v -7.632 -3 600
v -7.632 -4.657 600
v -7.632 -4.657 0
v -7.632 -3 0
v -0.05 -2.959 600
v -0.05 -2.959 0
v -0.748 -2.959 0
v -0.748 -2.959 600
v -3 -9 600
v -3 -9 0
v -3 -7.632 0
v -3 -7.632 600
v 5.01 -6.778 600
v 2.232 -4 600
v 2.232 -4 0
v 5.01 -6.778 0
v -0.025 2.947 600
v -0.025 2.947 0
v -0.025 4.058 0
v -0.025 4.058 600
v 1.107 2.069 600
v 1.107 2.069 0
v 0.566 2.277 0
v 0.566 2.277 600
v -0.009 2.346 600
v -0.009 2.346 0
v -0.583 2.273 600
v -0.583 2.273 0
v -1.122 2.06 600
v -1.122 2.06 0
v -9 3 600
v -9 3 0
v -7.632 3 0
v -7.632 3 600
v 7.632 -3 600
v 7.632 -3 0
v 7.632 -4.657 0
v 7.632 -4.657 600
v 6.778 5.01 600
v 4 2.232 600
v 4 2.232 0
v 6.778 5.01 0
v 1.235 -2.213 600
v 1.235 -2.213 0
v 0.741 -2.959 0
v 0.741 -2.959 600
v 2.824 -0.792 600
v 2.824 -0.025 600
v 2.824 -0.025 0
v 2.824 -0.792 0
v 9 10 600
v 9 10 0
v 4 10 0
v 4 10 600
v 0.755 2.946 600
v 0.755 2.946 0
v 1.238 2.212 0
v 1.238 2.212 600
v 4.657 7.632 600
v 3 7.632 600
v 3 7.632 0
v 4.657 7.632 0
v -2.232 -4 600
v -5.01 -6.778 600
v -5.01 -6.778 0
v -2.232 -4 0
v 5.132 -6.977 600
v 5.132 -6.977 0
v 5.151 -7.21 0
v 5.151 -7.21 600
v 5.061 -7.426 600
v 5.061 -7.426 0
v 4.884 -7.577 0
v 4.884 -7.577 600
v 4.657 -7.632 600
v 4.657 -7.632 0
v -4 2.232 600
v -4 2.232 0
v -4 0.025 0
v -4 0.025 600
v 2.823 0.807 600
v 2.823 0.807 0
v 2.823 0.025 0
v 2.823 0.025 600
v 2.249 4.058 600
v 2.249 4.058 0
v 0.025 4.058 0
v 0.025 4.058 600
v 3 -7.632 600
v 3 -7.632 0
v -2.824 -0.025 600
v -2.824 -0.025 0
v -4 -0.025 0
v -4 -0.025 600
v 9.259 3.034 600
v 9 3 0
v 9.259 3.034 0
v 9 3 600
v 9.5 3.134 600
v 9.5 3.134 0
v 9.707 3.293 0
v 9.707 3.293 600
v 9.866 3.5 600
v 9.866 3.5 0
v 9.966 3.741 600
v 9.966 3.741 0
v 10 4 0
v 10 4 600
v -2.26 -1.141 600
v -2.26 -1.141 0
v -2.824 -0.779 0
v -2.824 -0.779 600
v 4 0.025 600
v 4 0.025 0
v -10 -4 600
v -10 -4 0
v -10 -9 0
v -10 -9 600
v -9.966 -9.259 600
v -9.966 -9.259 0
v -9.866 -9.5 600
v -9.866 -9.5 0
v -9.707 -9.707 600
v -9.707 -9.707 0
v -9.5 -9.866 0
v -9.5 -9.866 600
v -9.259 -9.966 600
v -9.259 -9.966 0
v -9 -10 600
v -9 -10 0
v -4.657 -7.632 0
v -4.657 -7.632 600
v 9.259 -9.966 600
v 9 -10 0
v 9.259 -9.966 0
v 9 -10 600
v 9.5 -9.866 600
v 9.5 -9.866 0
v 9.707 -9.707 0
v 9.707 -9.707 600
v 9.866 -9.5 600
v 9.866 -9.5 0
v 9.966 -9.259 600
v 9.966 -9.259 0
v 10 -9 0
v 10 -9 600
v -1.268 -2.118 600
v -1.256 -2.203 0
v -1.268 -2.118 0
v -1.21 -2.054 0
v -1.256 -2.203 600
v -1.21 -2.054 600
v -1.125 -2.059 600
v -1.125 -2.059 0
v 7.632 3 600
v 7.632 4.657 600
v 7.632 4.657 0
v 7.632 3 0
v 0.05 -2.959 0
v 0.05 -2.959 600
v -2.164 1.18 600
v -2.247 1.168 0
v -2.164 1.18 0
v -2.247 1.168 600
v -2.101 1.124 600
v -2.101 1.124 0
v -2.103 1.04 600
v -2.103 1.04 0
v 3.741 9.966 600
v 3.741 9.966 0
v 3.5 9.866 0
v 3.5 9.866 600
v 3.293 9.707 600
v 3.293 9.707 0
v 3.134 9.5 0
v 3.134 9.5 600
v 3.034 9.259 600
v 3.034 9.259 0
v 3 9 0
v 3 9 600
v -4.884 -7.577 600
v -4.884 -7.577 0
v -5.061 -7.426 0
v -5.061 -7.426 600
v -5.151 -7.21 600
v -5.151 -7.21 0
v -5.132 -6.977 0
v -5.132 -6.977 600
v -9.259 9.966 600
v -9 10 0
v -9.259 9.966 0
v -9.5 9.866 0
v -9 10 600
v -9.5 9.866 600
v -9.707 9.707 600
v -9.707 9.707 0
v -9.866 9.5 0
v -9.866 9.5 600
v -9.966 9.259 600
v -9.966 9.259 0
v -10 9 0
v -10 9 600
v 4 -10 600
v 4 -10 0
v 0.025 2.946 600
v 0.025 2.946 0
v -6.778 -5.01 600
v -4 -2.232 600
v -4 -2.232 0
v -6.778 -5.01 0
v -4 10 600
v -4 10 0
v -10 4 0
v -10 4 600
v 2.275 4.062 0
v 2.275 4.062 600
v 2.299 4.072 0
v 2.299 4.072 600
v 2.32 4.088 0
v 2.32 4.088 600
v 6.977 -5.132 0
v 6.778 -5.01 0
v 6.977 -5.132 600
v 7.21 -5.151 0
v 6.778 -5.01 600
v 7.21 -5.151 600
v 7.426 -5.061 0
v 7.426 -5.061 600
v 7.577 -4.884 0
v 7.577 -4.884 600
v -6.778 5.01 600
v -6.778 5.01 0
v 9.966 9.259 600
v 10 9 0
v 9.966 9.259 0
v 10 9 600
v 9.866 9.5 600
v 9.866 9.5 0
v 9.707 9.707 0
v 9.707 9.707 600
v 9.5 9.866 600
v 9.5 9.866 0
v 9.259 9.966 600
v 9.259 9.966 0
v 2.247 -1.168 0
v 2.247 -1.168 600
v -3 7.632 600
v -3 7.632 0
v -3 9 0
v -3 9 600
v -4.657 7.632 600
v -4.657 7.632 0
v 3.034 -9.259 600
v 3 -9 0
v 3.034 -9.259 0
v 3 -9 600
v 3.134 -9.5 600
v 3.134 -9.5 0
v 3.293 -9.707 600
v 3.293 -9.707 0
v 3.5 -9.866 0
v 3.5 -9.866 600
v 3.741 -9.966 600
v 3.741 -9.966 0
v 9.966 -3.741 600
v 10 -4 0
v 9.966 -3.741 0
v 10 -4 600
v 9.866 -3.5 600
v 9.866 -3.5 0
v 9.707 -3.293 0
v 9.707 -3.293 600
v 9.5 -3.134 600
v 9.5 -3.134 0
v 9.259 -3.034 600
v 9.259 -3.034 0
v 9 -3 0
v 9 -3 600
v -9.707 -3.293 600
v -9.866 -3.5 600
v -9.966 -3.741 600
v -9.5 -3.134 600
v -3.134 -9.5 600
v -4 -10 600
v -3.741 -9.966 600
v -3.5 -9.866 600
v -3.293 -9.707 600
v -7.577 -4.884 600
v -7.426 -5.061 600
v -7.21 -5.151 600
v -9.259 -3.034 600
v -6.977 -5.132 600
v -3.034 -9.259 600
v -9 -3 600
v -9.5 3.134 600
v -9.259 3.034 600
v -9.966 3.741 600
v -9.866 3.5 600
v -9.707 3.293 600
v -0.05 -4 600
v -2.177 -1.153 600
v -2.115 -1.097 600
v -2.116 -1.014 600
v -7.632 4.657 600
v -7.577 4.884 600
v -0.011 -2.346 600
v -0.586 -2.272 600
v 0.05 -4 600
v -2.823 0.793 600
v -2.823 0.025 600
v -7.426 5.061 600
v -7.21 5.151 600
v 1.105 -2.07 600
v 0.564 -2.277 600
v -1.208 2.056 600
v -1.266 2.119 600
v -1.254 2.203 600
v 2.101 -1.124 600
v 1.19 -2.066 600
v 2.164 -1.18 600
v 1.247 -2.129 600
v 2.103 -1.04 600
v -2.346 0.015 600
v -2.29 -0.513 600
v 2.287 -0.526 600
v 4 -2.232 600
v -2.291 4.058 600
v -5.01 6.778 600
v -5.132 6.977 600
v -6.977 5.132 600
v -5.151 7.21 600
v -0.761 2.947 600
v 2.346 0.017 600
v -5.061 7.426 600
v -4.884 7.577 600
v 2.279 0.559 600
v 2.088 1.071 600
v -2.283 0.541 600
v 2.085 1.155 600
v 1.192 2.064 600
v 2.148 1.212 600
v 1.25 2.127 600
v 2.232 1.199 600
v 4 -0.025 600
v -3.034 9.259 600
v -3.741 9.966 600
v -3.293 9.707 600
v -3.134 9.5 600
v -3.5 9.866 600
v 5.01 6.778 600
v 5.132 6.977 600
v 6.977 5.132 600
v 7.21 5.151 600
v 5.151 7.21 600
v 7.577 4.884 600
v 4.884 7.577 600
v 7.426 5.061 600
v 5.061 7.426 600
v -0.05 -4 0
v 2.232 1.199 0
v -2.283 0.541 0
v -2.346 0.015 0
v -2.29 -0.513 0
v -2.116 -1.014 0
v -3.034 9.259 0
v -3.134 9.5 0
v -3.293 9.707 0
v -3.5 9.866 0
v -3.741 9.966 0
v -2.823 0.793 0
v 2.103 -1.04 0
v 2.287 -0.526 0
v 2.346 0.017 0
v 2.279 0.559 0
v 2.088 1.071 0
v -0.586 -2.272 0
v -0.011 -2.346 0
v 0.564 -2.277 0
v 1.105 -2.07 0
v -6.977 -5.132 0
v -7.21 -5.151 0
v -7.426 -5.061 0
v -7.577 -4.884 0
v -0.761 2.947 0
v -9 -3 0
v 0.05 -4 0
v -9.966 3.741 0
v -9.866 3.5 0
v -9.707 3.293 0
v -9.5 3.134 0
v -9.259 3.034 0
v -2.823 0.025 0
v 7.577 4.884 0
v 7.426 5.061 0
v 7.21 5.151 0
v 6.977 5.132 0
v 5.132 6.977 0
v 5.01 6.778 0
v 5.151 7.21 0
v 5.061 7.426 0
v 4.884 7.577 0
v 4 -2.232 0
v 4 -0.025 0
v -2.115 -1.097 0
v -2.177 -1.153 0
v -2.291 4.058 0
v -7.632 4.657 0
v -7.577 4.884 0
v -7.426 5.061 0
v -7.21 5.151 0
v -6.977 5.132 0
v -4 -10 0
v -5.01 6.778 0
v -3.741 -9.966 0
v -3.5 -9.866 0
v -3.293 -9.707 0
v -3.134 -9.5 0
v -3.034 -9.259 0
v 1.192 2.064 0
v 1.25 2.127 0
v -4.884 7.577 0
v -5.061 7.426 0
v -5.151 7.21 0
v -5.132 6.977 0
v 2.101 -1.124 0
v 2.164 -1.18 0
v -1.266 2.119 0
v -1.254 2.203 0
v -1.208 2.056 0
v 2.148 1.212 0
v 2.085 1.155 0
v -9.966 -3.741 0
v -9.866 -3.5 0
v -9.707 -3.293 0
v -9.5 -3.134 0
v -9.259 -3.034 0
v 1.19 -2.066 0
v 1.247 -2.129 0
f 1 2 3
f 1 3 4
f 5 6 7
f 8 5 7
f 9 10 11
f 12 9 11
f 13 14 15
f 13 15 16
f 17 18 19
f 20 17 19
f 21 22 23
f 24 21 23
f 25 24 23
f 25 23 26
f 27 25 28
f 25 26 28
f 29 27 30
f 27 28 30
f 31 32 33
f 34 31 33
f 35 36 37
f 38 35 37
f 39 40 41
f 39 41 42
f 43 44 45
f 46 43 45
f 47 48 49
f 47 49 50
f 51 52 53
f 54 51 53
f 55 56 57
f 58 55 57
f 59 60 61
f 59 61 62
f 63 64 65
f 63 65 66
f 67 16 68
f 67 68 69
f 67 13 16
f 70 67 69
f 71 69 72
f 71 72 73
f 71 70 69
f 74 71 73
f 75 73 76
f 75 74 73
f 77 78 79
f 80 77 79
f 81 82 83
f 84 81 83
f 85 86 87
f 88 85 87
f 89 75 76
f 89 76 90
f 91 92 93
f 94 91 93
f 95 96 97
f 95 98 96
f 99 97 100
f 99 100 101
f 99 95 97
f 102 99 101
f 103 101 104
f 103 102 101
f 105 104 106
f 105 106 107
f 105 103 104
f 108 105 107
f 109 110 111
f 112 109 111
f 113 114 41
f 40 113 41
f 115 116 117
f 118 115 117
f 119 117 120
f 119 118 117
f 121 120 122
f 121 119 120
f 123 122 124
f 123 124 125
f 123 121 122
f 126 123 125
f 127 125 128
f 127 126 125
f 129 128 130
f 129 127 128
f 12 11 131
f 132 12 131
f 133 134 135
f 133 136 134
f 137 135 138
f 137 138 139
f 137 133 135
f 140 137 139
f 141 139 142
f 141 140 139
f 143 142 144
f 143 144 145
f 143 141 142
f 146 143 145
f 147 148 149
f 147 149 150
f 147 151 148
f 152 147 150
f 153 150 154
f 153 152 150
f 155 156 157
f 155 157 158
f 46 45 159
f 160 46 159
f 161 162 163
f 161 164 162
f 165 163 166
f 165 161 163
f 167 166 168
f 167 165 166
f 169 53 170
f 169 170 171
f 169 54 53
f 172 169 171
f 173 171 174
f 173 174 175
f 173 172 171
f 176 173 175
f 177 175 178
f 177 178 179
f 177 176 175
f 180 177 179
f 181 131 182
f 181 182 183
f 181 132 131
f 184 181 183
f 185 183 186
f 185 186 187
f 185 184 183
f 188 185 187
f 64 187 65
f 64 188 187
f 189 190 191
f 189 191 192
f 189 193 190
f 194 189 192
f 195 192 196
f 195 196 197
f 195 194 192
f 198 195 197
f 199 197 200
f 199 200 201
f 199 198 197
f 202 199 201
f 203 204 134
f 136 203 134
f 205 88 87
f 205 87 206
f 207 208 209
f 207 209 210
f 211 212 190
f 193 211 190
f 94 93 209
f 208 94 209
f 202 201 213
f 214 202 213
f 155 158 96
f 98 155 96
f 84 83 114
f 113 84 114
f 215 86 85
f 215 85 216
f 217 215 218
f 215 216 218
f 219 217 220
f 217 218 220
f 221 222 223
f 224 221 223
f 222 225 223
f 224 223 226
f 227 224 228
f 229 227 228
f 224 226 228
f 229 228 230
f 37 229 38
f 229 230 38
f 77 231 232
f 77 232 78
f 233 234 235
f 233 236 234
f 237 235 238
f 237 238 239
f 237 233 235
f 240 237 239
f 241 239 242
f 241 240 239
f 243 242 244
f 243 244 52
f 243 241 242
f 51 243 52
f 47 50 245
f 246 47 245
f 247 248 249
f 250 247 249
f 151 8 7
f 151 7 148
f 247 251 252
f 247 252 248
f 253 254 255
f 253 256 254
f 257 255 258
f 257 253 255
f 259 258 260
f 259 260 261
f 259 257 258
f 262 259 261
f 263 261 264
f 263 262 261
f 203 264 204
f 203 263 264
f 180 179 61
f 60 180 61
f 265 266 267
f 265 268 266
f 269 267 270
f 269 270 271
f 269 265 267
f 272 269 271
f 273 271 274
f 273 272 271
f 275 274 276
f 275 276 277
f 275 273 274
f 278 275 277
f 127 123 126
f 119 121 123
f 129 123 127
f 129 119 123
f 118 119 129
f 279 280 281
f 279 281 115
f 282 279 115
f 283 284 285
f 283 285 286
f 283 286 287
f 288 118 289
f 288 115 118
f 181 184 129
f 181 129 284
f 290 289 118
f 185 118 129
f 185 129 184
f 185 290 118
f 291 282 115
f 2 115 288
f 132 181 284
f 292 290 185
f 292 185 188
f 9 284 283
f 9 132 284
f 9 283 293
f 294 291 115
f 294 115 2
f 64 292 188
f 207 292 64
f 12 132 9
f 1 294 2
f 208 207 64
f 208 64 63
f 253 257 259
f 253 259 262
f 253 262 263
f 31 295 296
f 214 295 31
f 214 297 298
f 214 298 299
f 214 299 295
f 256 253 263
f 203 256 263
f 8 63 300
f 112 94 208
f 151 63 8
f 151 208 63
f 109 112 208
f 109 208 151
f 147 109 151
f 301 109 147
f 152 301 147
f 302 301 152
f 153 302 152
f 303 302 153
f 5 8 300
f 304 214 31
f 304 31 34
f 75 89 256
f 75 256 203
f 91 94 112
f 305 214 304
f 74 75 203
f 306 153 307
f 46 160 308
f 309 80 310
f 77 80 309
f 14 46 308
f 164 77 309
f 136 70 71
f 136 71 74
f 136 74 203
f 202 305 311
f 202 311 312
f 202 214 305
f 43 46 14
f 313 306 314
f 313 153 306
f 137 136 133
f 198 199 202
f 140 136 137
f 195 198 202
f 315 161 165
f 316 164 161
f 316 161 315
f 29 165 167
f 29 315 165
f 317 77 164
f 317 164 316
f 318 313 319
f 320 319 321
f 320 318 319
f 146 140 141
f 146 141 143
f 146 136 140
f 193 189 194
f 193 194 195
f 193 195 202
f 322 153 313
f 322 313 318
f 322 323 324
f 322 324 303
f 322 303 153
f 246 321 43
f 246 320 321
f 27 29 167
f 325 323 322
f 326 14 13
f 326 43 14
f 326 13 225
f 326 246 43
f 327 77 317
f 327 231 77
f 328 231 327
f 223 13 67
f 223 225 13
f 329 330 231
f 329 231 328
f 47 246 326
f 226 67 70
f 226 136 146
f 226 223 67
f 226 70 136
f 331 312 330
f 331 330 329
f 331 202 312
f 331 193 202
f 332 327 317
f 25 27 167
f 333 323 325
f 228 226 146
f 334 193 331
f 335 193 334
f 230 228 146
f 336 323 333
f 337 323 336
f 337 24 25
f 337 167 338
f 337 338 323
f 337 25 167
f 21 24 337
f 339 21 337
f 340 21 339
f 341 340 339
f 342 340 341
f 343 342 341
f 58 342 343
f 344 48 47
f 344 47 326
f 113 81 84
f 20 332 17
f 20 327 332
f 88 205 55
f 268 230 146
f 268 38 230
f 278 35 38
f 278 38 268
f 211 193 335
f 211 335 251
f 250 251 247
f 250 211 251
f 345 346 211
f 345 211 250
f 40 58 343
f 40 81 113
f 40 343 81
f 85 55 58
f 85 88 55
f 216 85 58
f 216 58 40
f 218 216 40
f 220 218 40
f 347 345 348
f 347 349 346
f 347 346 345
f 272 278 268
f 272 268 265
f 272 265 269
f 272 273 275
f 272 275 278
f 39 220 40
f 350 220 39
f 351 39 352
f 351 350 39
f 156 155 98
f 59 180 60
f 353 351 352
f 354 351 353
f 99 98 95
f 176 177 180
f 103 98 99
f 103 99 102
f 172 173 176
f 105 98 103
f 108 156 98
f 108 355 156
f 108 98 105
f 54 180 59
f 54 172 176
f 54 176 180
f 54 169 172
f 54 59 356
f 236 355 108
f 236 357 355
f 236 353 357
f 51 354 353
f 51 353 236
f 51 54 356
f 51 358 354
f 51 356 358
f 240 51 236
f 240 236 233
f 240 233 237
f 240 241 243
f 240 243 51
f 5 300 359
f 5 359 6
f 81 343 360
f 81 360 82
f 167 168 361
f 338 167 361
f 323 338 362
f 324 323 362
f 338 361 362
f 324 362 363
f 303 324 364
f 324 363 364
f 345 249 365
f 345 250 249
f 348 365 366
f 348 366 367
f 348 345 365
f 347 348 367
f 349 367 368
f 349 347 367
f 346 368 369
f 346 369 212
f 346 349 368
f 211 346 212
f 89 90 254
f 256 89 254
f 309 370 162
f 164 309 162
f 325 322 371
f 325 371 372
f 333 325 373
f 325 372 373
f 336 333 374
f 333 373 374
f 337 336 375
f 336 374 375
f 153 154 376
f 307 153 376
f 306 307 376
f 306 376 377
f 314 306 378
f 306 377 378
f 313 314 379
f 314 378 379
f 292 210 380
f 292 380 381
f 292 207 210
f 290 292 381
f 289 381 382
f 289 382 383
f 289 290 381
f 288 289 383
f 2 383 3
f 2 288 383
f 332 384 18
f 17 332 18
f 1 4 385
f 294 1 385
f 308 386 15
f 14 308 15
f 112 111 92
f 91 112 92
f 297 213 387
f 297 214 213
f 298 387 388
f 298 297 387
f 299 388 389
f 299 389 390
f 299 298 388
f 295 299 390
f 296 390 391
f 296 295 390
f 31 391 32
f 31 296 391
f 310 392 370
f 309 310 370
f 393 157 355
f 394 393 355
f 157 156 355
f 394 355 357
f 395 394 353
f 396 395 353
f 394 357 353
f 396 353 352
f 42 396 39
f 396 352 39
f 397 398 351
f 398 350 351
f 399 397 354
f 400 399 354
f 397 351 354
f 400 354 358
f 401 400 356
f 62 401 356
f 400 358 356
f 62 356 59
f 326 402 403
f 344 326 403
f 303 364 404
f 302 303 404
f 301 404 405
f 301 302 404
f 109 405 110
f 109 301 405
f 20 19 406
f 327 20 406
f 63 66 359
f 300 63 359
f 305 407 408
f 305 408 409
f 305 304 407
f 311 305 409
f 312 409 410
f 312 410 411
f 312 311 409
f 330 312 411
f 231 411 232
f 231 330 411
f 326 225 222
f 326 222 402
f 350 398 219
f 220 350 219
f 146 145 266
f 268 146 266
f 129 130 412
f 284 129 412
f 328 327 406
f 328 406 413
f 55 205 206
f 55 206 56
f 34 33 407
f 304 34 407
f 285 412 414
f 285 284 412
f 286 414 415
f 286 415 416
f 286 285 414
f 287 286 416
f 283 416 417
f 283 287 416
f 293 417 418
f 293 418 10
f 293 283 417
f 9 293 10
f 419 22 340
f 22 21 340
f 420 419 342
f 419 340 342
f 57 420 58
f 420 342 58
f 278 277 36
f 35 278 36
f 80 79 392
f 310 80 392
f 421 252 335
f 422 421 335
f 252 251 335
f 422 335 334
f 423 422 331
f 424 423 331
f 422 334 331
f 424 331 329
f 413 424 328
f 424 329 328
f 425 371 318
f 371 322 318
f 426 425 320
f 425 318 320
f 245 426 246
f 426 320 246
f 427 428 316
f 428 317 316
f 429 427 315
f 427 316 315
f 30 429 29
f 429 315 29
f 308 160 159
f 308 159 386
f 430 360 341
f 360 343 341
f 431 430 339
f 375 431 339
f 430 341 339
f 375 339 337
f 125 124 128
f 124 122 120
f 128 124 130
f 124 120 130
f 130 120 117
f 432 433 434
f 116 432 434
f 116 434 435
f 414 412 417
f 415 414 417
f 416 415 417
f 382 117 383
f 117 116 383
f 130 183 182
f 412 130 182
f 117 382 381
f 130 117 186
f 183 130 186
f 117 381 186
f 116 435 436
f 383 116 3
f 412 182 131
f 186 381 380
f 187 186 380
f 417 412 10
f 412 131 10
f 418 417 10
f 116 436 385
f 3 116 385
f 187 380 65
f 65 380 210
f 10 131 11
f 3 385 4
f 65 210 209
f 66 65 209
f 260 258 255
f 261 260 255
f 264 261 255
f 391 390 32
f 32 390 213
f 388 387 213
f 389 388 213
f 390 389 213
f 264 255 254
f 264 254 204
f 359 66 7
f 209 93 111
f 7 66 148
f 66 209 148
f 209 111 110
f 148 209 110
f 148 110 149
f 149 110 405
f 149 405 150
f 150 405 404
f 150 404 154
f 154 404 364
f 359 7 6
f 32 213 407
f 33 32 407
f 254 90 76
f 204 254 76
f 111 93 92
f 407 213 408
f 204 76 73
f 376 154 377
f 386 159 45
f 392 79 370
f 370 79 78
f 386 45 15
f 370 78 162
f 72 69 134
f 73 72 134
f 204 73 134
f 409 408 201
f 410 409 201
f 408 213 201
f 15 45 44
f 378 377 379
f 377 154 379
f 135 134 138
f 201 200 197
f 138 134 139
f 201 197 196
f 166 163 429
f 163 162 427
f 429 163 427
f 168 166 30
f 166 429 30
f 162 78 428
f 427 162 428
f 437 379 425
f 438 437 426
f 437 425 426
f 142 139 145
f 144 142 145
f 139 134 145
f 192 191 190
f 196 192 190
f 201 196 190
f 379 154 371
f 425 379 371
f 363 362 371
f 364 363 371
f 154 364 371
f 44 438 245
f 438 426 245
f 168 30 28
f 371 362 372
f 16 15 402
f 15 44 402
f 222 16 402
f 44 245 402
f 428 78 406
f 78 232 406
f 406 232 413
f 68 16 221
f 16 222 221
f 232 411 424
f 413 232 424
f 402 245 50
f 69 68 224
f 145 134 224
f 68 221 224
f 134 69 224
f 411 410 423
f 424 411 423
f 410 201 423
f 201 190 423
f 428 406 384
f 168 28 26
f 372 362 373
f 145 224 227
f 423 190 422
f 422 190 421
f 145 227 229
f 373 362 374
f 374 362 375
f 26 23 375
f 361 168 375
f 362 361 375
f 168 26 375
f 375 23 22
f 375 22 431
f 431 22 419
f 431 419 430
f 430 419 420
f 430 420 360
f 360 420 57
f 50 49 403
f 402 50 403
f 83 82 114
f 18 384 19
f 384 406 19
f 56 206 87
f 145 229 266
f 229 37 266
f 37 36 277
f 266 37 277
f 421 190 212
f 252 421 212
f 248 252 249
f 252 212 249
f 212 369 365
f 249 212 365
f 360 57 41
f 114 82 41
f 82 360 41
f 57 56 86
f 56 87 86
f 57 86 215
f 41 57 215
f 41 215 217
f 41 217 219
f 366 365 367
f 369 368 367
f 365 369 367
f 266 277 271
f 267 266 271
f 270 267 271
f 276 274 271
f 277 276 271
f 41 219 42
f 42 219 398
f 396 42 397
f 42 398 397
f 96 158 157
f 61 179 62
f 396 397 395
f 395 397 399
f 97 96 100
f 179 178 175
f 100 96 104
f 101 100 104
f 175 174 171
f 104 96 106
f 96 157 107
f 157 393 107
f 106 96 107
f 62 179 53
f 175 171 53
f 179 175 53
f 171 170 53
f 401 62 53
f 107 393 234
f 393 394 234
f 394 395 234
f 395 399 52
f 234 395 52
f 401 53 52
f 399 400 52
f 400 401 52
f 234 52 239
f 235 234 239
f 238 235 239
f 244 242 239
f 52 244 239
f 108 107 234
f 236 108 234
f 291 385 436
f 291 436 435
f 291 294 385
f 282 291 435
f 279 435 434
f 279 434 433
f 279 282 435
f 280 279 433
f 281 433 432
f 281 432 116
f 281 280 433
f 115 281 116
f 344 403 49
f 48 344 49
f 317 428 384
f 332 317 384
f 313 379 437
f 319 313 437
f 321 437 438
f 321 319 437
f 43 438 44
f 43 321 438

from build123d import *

# Parameters (mm, degrees)
F1_DEPTH = 600
F2_R     = 1
F3_R     = 0.5
F4_R     = 0.1


with BuildPart() as f1:
    # F0 (on Top) → F1 (new body)
    with BuildSketch(Plane.XY):
        with BuildLine():
            Line((-0.025, 4.0583112277), (-2.2905442747, 4.0583112277))
            Line((-2.2905442747, 4.0583112277), (-5.8640526549, 7.6318196079))
            Line((-5.8640526549, 7.6318196079), (-3, 7.6318196079))
            Line((-3, 7.6318196079), (-3, 10))
            Line((-3, 10), (-10, 10))
            Line((-10, 10), (-10, 3))
            Line((-10, 3), (-7.6318196079, 3))
            Line((-7.6318196079, 3), (-7.6318196079, 5.8640526549))
            Line((-7.6318196079, 5.8640526549), (-4, 2.232233047))
            Line((-4, 2.232233047), (-4, 0.025))
            Line((-4, 0.025), (-2.8230957687, 0.025))
            Line((-2.8230957687, 0.025), (-2.8230957687, 0.7926485917))
            Line((-2.8230957687, 0.7926485917), (-1.8740334308, 1.411684829))
            ThreePointArc((-1.8740334308, 1.411684829), (-2.3460869309, 0.0270456781), (-1.906078865, -1.3681077138))
            Line((-1.906078865, -1.3681077138), (-2.8238623803, -0.7794121329))
            Line((-2.8238623803, -0.7794121329), (-2.8238623803, -0.025))
            Line((-2.8238623803, -0.025), (-4, -0.025))
            Line((-4, -0.025), (-4, -2.232233047))
            Line((-4, -2.232233047), (-7.6318196079, -5.8640526549))
            Line((-7.6318196079, -5.8640526549), (-7.6318196079, -3))
            Line((-7.6318196079, -3), (-10, -3))
            Line((-10, -3), (-10, -10))
            Line((-10, -10), (-3, -10))
            Line((-3, -10), (-3, -7.6318196079))
            Line((-3, -7.6318196079), (-5.8640526549, -7.6318196079))
            Line((-5.8640526549, -7.6318196079), (-2.232233047, -4))
            Line((-2.232233047, -4), (-0.05, -4))
            Line((-0.05, -4), (-0.05, -2.9588690959))
            Line((-0.05, -2.9588690959), (-0.7483266194, -2.9588690959))
            Line((-0.7483266194, -2.9588690959), (-1.5537911294, -1.7580069631))
            ThreePointArc((-1.5537911294, -1.7580069631), (-0.0257632285, -2.3461013645), (1.5148107083, -1.7917041816))
            Line((1.5148107083, -1.7917041816), (0.7406048023, -2.9588690959))
            Line((0.7406048023, -2.9588690959), (0.05, -2.9588690959))
            Line((0.05, -2.9588690959), (0.05, -4))
            Line((0.05, -4), (2.232233047, -4))
            Line((2.232233047, -4), (5.8640526549, -7.6318196079))
            Line((5.8640526549, -7.6318196079), (3, -7.6318196079))
            Line((3, -7.6318196079), (3, -10))
            Line((3, -10), (10, -10))
            Line((10, -10), (10, -3))
            Line((10, -3), (7.6318196079, -3))
            Line((7.6318196079, -3), (7.6318196079, -5.8640526549))
            Line((7.6318196079, -5.8640526549), (4, -2.232233047))
            Line((4, -2.232233047), (4, -0.025))
            Line((4, -0.025), (2.8238623803, -0.025))
            Line((2.8238623803, -0.025), (2.8238623803, -0.7921485609))
            Line((2.8238623803, -0.7921485609), (1.8740334308, -1.411684829))
            ThreePointArc((1.8740334308, -1.411684829), (2.3460040432, 0.0334721598), (1.8329957125, 1.4645757318))
            Line((1.8329957125, 1.4645757318), (2.8230957687, 0.8068363719))
            Line((2.8230957687, 0.8068363719), (2.8230957687, 0.025))
            Line((2.8230957687, 0.025), (4, 0.025))
            Line((4, 0.025), (4, 2.232233047))
            Line((4, 2.232233047), (7.6318196079, 5.8640526549))
            Line((7.6318196079, 5.8640526549), (7.6318196079, 3))
            Line((7.6318196079, 3), (10, 3))
            Line((10, 3), (10, 10))
            Line((10, 10), (3, 10))
            Line((3, 10), (3, 7.6318196079))
            Line((3, 7.6318196079), (5.8640526549, 7.6318196079))
            Line((5.8640526549, 7.6318196079), (2.2905442747, 4.0583112277))
            Line((2.2905442747, 4.0583112277), (0.025, 4.0583112277))
            Line((0.025, 4.0583112277), (0.025, 2.9460287187))
            Line((0.025, 2.9460287187), (0.7554459771, 2.9460287187))
            Line((0.7554459771, 2.9460287187), (1.5118729288, 1.7941838266))
            ThreePointArc((1.5118729288, 1.7941838266), (-0.0195250931, 2.3461615731), (-1.5415243666, 1.7687730164))
            Line((-1.5415243666, 1.7687730164), (-0.7608180556, 2.9474266339))
            Line((-0.7608180556, 2.9474266339), (-0.025, 2.9474266339))
            Line((-0.025, 2.9474266339), (-0.025, 4.0583112277))
        make_face()
    extrude(amount=F1_DEPTH)

    # F2
    f2_edges = [f1.edges().sort_by_distance(p)[0] for p in [
        (10, 10, 300),
        (10, -10, 300),
        (-10, -10, 300),
        (-3, -10, 300),
        (3, -10, 300),
        (-3, 10, 300),
        (-10, 3, 300),
        (10, 3, 300),
        (10, -3, 300),
        (-10, -3, 300),
        (-10, 10, 300),
        (3, 10, 300),
    ]]
    fillet(f2_edges, radius=F2_R)

    # F3
    f3_edges = [f1.edges().sort_by_distance(p)[0] for p in [
        (-7.63182, 5.864053, 300),
        (-5.864053, 7.63182, 300),
        (5.864053, 7.63182, 300),
        (7.63182, 5.864053, 300),
        (-7.63182, -5.864053, 300),
        (-5.864053, -7.63182, 300),
        (5.864053, -7.63182, 300),
        (7.63182, -5.864053, 300),
    ]]
    fillet(f3_edges, radius=F3_R)

    # F4
    f4_edges = [f1.edges().sort_by_distance(p)[0] for p in [
        (-1.874033, 1.411685, 300),
        (2.290544, 4.058311, 300),
        (4.656946, 7.63182, 300),
        (-1.541524, 1.768773, 300),
        (1.514811, -1.791704, 300),
        (1.874033, -1.411685, 300),
        (1.832996, 1.464576, 300),
        (1.511873, 1.794184, 300),
        (-1.906079, -1.368108, 300),
        (-1.553791, -1.758007, 300),
    ]]
    fillet(f4_edges, radius=F4_R)


solid = f1.part
